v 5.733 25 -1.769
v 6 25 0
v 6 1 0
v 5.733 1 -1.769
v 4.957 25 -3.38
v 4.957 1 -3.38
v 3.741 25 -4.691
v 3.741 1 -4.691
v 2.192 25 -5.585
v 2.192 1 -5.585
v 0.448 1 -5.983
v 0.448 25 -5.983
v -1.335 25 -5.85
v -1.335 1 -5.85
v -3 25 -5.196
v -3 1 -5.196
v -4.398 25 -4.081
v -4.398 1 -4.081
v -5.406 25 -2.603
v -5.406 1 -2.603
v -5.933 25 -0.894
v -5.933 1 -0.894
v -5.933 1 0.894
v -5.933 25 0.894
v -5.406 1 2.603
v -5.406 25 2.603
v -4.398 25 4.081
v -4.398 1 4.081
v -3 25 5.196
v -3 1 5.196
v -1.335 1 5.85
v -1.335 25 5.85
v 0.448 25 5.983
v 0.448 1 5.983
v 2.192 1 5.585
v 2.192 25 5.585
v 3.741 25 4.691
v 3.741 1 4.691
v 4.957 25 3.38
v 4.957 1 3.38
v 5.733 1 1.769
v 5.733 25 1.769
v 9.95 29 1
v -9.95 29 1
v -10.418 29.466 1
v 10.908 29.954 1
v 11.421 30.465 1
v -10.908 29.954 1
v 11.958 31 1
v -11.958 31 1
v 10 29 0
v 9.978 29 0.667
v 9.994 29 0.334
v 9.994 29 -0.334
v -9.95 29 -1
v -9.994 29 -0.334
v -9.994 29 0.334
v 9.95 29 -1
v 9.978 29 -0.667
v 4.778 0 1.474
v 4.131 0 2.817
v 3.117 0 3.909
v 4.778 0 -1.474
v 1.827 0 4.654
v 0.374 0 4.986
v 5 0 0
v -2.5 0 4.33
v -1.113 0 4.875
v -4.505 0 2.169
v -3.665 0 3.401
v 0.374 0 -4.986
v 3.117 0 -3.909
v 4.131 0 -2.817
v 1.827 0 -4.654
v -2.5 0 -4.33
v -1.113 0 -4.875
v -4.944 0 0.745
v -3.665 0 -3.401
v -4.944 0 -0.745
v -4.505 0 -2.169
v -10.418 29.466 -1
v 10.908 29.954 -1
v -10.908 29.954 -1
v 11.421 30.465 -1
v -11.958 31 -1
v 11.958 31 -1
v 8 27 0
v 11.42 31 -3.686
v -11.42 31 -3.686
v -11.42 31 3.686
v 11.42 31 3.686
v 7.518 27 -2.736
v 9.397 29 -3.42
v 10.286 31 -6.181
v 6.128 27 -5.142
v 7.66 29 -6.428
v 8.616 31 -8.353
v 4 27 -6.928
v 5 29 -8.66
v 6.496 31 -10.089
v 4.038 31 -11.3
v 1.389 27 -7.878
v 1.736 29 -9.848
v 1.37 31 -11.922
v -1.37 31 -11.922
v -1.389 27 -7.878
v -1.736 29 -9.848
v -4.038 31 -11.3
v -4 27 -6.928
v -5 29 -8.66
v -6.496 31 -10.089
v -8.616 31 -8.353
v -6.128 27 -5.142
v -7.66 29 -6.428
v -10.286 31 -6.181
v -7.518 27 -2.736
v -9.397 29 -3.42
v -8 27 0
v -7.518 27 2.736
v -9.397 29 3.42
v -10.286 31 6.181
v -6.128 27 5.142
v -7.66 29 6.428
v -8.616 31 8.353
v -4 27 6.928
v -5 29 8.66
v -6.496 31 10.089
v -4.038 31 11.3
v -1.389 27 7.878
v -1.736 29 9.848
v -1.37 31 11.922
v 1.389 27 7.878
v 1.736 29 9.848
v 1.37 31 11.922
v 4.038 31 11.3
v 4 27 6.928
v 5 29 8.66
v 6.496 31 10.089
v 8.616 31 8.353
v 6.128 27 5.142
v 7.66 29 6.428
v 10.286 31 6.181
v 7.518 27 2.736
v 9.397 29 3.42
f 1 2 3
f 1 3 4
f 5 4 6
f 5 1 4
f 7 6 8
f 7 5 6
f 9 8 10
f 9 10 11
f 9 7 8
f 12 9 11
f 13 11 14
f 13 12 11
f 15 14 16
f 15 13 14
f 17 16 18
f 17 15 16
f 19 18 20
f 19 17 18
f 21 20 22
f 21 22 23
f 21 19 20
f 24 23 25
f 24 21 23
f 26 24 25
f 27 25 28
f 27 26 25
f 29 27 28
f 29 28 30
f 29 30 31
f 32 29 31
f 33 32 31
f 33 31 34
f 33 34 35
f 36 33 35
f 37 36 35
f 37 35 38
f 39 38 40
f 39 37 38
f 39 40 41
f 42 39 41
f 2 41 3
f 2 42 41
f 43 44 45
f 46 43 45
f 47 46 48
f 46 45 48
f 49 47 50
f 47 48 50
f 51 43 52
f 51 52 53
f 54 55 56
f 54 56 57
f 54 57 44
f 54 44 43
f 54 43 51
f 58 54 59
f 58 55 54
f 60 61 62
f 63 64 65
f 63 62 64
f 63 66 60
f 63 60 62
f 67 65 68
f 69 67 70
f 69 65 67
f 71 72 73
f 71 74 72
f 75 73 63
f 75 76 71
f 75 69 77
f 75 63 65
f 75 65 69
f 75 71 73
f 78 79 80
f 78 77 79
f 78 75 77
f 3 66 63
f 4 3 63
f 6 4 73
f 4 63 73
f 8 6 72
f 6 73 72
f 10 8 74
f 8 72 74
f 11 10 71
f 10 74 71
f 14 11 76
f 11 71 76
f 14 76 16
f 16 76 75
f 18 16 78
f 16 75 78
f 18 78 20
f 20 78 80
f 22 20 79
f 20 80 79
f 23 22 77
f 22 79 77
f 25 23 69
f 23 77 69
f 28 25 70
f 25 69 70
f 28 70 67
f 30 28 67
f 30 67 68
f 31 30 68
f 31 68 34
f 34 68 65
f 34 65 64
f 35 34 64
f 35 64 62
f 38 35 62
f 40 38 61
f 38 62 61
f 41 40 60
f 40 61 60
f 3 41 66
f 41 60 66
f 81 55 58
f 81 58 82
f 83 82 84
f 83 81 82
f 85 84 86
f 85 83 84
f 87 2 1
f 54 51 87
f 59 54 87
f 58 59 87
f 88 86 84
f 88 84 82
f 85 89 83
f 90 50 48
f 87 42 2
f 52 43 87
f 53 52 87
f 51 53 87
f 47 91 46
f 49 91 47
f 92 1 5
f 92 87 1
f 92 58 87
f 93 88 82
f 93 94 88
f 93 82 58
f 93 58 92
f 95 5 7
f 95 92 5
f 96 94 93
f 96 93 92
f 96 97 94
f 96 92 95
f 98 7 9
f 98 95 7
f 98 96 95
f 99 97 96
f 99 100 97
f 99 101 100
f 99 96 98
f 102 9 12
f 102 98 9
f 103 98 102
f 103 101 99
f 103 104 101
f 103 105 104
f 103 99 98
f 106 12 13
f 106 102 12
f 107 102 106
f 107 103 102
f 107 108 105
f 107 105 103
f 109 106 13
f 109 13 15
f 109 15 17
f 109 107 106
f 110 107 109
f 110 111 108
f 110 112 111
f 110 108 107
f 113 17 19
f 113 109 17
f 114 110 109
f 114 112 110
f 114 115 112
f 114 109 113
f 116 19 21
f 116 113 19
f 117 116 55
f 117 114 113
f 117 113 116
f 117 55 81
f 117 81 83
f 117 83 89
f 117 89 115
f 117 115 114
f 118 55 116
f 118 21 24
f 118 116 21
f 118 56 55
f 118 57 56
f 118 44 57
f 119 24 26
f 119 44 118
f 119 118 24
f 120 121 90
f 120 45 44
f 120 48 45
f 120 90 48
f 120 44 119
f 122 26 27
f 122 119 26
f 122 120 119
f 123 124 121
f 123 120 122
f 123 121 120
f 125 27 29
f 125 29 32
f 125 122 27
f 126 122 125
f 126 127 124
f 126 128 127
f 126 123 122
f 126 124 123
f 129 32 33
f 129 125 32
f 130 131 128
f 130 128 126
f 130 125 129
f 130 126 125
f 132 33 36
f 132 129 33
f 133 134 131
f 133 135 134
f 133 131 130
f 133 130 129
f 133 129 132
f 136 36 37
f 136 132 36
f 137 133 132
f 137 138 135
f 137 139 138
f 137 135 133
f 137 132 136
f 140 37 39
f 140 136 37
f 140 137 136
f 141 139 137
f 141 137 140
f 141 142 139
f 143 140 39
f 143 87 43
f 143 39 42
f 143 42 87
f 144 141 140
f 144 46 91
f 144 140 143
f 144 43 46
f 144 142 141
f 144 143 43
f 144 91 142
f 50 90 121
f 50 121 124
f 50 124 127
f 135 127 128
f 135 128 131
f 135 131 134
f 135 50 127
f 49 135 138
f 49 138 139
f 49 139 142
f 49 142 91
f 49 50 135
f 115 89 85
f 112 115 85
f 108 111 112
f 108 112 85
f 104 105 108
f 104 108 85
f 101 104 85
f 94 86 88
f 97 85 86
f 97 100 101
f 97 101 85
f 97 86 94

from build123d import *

# Parameters (mm, degrees)
CUT_EXTRUDE1_DEPTH      = 36.341194094
CUT_EXTRUDE1_DEPTH_BACK = 36.341194094
SKETCH3_W               = 2
SKETCH3_H               = 2
CHAMFER1_SIZE           = 1


with BuildPart() as part:
    # Sketch2 → Revolve1 (revolve)
    with BuildSketch(Plane.XY):
        Polygon((1, 31), (1, 29), (0, 29), (0, 0), (6, 0), (6, 25), (12, 31), align=None)
    revolve(axis=Axis((0, 0, 0), (0, 1, 0)))

    # Sketch3 → Cut-Extrude1 (cut, two sides: drawn at the far end of the back side and taken through both)
    with BuildSketch(Plane(origin=(0, 0, 0), x_dir=(0, 0, -1), z_dir=(1, 0, 0)).offset(-CUT_EXTRUDE1_DEPTH_BACK)):
        with Locations((0, 30)):
            Rectangle(SKETCH3_W, SKETCH3_H)
    extrude(amount=CUT_EXTRUDE1_DEPTH + CUT_EXTRUDE1_DEPTH_BACK, mode=Mode.SUBTRACT)

    # Chamfer1
    chamfer1_edges = [part.edges().sort_by_distance(p)[0] for p in [
        (-6, 0, 0),
    ]]
    chamfer(chamfer1_edges, length=CHAMFER1_SIZE)


solid = part.part
